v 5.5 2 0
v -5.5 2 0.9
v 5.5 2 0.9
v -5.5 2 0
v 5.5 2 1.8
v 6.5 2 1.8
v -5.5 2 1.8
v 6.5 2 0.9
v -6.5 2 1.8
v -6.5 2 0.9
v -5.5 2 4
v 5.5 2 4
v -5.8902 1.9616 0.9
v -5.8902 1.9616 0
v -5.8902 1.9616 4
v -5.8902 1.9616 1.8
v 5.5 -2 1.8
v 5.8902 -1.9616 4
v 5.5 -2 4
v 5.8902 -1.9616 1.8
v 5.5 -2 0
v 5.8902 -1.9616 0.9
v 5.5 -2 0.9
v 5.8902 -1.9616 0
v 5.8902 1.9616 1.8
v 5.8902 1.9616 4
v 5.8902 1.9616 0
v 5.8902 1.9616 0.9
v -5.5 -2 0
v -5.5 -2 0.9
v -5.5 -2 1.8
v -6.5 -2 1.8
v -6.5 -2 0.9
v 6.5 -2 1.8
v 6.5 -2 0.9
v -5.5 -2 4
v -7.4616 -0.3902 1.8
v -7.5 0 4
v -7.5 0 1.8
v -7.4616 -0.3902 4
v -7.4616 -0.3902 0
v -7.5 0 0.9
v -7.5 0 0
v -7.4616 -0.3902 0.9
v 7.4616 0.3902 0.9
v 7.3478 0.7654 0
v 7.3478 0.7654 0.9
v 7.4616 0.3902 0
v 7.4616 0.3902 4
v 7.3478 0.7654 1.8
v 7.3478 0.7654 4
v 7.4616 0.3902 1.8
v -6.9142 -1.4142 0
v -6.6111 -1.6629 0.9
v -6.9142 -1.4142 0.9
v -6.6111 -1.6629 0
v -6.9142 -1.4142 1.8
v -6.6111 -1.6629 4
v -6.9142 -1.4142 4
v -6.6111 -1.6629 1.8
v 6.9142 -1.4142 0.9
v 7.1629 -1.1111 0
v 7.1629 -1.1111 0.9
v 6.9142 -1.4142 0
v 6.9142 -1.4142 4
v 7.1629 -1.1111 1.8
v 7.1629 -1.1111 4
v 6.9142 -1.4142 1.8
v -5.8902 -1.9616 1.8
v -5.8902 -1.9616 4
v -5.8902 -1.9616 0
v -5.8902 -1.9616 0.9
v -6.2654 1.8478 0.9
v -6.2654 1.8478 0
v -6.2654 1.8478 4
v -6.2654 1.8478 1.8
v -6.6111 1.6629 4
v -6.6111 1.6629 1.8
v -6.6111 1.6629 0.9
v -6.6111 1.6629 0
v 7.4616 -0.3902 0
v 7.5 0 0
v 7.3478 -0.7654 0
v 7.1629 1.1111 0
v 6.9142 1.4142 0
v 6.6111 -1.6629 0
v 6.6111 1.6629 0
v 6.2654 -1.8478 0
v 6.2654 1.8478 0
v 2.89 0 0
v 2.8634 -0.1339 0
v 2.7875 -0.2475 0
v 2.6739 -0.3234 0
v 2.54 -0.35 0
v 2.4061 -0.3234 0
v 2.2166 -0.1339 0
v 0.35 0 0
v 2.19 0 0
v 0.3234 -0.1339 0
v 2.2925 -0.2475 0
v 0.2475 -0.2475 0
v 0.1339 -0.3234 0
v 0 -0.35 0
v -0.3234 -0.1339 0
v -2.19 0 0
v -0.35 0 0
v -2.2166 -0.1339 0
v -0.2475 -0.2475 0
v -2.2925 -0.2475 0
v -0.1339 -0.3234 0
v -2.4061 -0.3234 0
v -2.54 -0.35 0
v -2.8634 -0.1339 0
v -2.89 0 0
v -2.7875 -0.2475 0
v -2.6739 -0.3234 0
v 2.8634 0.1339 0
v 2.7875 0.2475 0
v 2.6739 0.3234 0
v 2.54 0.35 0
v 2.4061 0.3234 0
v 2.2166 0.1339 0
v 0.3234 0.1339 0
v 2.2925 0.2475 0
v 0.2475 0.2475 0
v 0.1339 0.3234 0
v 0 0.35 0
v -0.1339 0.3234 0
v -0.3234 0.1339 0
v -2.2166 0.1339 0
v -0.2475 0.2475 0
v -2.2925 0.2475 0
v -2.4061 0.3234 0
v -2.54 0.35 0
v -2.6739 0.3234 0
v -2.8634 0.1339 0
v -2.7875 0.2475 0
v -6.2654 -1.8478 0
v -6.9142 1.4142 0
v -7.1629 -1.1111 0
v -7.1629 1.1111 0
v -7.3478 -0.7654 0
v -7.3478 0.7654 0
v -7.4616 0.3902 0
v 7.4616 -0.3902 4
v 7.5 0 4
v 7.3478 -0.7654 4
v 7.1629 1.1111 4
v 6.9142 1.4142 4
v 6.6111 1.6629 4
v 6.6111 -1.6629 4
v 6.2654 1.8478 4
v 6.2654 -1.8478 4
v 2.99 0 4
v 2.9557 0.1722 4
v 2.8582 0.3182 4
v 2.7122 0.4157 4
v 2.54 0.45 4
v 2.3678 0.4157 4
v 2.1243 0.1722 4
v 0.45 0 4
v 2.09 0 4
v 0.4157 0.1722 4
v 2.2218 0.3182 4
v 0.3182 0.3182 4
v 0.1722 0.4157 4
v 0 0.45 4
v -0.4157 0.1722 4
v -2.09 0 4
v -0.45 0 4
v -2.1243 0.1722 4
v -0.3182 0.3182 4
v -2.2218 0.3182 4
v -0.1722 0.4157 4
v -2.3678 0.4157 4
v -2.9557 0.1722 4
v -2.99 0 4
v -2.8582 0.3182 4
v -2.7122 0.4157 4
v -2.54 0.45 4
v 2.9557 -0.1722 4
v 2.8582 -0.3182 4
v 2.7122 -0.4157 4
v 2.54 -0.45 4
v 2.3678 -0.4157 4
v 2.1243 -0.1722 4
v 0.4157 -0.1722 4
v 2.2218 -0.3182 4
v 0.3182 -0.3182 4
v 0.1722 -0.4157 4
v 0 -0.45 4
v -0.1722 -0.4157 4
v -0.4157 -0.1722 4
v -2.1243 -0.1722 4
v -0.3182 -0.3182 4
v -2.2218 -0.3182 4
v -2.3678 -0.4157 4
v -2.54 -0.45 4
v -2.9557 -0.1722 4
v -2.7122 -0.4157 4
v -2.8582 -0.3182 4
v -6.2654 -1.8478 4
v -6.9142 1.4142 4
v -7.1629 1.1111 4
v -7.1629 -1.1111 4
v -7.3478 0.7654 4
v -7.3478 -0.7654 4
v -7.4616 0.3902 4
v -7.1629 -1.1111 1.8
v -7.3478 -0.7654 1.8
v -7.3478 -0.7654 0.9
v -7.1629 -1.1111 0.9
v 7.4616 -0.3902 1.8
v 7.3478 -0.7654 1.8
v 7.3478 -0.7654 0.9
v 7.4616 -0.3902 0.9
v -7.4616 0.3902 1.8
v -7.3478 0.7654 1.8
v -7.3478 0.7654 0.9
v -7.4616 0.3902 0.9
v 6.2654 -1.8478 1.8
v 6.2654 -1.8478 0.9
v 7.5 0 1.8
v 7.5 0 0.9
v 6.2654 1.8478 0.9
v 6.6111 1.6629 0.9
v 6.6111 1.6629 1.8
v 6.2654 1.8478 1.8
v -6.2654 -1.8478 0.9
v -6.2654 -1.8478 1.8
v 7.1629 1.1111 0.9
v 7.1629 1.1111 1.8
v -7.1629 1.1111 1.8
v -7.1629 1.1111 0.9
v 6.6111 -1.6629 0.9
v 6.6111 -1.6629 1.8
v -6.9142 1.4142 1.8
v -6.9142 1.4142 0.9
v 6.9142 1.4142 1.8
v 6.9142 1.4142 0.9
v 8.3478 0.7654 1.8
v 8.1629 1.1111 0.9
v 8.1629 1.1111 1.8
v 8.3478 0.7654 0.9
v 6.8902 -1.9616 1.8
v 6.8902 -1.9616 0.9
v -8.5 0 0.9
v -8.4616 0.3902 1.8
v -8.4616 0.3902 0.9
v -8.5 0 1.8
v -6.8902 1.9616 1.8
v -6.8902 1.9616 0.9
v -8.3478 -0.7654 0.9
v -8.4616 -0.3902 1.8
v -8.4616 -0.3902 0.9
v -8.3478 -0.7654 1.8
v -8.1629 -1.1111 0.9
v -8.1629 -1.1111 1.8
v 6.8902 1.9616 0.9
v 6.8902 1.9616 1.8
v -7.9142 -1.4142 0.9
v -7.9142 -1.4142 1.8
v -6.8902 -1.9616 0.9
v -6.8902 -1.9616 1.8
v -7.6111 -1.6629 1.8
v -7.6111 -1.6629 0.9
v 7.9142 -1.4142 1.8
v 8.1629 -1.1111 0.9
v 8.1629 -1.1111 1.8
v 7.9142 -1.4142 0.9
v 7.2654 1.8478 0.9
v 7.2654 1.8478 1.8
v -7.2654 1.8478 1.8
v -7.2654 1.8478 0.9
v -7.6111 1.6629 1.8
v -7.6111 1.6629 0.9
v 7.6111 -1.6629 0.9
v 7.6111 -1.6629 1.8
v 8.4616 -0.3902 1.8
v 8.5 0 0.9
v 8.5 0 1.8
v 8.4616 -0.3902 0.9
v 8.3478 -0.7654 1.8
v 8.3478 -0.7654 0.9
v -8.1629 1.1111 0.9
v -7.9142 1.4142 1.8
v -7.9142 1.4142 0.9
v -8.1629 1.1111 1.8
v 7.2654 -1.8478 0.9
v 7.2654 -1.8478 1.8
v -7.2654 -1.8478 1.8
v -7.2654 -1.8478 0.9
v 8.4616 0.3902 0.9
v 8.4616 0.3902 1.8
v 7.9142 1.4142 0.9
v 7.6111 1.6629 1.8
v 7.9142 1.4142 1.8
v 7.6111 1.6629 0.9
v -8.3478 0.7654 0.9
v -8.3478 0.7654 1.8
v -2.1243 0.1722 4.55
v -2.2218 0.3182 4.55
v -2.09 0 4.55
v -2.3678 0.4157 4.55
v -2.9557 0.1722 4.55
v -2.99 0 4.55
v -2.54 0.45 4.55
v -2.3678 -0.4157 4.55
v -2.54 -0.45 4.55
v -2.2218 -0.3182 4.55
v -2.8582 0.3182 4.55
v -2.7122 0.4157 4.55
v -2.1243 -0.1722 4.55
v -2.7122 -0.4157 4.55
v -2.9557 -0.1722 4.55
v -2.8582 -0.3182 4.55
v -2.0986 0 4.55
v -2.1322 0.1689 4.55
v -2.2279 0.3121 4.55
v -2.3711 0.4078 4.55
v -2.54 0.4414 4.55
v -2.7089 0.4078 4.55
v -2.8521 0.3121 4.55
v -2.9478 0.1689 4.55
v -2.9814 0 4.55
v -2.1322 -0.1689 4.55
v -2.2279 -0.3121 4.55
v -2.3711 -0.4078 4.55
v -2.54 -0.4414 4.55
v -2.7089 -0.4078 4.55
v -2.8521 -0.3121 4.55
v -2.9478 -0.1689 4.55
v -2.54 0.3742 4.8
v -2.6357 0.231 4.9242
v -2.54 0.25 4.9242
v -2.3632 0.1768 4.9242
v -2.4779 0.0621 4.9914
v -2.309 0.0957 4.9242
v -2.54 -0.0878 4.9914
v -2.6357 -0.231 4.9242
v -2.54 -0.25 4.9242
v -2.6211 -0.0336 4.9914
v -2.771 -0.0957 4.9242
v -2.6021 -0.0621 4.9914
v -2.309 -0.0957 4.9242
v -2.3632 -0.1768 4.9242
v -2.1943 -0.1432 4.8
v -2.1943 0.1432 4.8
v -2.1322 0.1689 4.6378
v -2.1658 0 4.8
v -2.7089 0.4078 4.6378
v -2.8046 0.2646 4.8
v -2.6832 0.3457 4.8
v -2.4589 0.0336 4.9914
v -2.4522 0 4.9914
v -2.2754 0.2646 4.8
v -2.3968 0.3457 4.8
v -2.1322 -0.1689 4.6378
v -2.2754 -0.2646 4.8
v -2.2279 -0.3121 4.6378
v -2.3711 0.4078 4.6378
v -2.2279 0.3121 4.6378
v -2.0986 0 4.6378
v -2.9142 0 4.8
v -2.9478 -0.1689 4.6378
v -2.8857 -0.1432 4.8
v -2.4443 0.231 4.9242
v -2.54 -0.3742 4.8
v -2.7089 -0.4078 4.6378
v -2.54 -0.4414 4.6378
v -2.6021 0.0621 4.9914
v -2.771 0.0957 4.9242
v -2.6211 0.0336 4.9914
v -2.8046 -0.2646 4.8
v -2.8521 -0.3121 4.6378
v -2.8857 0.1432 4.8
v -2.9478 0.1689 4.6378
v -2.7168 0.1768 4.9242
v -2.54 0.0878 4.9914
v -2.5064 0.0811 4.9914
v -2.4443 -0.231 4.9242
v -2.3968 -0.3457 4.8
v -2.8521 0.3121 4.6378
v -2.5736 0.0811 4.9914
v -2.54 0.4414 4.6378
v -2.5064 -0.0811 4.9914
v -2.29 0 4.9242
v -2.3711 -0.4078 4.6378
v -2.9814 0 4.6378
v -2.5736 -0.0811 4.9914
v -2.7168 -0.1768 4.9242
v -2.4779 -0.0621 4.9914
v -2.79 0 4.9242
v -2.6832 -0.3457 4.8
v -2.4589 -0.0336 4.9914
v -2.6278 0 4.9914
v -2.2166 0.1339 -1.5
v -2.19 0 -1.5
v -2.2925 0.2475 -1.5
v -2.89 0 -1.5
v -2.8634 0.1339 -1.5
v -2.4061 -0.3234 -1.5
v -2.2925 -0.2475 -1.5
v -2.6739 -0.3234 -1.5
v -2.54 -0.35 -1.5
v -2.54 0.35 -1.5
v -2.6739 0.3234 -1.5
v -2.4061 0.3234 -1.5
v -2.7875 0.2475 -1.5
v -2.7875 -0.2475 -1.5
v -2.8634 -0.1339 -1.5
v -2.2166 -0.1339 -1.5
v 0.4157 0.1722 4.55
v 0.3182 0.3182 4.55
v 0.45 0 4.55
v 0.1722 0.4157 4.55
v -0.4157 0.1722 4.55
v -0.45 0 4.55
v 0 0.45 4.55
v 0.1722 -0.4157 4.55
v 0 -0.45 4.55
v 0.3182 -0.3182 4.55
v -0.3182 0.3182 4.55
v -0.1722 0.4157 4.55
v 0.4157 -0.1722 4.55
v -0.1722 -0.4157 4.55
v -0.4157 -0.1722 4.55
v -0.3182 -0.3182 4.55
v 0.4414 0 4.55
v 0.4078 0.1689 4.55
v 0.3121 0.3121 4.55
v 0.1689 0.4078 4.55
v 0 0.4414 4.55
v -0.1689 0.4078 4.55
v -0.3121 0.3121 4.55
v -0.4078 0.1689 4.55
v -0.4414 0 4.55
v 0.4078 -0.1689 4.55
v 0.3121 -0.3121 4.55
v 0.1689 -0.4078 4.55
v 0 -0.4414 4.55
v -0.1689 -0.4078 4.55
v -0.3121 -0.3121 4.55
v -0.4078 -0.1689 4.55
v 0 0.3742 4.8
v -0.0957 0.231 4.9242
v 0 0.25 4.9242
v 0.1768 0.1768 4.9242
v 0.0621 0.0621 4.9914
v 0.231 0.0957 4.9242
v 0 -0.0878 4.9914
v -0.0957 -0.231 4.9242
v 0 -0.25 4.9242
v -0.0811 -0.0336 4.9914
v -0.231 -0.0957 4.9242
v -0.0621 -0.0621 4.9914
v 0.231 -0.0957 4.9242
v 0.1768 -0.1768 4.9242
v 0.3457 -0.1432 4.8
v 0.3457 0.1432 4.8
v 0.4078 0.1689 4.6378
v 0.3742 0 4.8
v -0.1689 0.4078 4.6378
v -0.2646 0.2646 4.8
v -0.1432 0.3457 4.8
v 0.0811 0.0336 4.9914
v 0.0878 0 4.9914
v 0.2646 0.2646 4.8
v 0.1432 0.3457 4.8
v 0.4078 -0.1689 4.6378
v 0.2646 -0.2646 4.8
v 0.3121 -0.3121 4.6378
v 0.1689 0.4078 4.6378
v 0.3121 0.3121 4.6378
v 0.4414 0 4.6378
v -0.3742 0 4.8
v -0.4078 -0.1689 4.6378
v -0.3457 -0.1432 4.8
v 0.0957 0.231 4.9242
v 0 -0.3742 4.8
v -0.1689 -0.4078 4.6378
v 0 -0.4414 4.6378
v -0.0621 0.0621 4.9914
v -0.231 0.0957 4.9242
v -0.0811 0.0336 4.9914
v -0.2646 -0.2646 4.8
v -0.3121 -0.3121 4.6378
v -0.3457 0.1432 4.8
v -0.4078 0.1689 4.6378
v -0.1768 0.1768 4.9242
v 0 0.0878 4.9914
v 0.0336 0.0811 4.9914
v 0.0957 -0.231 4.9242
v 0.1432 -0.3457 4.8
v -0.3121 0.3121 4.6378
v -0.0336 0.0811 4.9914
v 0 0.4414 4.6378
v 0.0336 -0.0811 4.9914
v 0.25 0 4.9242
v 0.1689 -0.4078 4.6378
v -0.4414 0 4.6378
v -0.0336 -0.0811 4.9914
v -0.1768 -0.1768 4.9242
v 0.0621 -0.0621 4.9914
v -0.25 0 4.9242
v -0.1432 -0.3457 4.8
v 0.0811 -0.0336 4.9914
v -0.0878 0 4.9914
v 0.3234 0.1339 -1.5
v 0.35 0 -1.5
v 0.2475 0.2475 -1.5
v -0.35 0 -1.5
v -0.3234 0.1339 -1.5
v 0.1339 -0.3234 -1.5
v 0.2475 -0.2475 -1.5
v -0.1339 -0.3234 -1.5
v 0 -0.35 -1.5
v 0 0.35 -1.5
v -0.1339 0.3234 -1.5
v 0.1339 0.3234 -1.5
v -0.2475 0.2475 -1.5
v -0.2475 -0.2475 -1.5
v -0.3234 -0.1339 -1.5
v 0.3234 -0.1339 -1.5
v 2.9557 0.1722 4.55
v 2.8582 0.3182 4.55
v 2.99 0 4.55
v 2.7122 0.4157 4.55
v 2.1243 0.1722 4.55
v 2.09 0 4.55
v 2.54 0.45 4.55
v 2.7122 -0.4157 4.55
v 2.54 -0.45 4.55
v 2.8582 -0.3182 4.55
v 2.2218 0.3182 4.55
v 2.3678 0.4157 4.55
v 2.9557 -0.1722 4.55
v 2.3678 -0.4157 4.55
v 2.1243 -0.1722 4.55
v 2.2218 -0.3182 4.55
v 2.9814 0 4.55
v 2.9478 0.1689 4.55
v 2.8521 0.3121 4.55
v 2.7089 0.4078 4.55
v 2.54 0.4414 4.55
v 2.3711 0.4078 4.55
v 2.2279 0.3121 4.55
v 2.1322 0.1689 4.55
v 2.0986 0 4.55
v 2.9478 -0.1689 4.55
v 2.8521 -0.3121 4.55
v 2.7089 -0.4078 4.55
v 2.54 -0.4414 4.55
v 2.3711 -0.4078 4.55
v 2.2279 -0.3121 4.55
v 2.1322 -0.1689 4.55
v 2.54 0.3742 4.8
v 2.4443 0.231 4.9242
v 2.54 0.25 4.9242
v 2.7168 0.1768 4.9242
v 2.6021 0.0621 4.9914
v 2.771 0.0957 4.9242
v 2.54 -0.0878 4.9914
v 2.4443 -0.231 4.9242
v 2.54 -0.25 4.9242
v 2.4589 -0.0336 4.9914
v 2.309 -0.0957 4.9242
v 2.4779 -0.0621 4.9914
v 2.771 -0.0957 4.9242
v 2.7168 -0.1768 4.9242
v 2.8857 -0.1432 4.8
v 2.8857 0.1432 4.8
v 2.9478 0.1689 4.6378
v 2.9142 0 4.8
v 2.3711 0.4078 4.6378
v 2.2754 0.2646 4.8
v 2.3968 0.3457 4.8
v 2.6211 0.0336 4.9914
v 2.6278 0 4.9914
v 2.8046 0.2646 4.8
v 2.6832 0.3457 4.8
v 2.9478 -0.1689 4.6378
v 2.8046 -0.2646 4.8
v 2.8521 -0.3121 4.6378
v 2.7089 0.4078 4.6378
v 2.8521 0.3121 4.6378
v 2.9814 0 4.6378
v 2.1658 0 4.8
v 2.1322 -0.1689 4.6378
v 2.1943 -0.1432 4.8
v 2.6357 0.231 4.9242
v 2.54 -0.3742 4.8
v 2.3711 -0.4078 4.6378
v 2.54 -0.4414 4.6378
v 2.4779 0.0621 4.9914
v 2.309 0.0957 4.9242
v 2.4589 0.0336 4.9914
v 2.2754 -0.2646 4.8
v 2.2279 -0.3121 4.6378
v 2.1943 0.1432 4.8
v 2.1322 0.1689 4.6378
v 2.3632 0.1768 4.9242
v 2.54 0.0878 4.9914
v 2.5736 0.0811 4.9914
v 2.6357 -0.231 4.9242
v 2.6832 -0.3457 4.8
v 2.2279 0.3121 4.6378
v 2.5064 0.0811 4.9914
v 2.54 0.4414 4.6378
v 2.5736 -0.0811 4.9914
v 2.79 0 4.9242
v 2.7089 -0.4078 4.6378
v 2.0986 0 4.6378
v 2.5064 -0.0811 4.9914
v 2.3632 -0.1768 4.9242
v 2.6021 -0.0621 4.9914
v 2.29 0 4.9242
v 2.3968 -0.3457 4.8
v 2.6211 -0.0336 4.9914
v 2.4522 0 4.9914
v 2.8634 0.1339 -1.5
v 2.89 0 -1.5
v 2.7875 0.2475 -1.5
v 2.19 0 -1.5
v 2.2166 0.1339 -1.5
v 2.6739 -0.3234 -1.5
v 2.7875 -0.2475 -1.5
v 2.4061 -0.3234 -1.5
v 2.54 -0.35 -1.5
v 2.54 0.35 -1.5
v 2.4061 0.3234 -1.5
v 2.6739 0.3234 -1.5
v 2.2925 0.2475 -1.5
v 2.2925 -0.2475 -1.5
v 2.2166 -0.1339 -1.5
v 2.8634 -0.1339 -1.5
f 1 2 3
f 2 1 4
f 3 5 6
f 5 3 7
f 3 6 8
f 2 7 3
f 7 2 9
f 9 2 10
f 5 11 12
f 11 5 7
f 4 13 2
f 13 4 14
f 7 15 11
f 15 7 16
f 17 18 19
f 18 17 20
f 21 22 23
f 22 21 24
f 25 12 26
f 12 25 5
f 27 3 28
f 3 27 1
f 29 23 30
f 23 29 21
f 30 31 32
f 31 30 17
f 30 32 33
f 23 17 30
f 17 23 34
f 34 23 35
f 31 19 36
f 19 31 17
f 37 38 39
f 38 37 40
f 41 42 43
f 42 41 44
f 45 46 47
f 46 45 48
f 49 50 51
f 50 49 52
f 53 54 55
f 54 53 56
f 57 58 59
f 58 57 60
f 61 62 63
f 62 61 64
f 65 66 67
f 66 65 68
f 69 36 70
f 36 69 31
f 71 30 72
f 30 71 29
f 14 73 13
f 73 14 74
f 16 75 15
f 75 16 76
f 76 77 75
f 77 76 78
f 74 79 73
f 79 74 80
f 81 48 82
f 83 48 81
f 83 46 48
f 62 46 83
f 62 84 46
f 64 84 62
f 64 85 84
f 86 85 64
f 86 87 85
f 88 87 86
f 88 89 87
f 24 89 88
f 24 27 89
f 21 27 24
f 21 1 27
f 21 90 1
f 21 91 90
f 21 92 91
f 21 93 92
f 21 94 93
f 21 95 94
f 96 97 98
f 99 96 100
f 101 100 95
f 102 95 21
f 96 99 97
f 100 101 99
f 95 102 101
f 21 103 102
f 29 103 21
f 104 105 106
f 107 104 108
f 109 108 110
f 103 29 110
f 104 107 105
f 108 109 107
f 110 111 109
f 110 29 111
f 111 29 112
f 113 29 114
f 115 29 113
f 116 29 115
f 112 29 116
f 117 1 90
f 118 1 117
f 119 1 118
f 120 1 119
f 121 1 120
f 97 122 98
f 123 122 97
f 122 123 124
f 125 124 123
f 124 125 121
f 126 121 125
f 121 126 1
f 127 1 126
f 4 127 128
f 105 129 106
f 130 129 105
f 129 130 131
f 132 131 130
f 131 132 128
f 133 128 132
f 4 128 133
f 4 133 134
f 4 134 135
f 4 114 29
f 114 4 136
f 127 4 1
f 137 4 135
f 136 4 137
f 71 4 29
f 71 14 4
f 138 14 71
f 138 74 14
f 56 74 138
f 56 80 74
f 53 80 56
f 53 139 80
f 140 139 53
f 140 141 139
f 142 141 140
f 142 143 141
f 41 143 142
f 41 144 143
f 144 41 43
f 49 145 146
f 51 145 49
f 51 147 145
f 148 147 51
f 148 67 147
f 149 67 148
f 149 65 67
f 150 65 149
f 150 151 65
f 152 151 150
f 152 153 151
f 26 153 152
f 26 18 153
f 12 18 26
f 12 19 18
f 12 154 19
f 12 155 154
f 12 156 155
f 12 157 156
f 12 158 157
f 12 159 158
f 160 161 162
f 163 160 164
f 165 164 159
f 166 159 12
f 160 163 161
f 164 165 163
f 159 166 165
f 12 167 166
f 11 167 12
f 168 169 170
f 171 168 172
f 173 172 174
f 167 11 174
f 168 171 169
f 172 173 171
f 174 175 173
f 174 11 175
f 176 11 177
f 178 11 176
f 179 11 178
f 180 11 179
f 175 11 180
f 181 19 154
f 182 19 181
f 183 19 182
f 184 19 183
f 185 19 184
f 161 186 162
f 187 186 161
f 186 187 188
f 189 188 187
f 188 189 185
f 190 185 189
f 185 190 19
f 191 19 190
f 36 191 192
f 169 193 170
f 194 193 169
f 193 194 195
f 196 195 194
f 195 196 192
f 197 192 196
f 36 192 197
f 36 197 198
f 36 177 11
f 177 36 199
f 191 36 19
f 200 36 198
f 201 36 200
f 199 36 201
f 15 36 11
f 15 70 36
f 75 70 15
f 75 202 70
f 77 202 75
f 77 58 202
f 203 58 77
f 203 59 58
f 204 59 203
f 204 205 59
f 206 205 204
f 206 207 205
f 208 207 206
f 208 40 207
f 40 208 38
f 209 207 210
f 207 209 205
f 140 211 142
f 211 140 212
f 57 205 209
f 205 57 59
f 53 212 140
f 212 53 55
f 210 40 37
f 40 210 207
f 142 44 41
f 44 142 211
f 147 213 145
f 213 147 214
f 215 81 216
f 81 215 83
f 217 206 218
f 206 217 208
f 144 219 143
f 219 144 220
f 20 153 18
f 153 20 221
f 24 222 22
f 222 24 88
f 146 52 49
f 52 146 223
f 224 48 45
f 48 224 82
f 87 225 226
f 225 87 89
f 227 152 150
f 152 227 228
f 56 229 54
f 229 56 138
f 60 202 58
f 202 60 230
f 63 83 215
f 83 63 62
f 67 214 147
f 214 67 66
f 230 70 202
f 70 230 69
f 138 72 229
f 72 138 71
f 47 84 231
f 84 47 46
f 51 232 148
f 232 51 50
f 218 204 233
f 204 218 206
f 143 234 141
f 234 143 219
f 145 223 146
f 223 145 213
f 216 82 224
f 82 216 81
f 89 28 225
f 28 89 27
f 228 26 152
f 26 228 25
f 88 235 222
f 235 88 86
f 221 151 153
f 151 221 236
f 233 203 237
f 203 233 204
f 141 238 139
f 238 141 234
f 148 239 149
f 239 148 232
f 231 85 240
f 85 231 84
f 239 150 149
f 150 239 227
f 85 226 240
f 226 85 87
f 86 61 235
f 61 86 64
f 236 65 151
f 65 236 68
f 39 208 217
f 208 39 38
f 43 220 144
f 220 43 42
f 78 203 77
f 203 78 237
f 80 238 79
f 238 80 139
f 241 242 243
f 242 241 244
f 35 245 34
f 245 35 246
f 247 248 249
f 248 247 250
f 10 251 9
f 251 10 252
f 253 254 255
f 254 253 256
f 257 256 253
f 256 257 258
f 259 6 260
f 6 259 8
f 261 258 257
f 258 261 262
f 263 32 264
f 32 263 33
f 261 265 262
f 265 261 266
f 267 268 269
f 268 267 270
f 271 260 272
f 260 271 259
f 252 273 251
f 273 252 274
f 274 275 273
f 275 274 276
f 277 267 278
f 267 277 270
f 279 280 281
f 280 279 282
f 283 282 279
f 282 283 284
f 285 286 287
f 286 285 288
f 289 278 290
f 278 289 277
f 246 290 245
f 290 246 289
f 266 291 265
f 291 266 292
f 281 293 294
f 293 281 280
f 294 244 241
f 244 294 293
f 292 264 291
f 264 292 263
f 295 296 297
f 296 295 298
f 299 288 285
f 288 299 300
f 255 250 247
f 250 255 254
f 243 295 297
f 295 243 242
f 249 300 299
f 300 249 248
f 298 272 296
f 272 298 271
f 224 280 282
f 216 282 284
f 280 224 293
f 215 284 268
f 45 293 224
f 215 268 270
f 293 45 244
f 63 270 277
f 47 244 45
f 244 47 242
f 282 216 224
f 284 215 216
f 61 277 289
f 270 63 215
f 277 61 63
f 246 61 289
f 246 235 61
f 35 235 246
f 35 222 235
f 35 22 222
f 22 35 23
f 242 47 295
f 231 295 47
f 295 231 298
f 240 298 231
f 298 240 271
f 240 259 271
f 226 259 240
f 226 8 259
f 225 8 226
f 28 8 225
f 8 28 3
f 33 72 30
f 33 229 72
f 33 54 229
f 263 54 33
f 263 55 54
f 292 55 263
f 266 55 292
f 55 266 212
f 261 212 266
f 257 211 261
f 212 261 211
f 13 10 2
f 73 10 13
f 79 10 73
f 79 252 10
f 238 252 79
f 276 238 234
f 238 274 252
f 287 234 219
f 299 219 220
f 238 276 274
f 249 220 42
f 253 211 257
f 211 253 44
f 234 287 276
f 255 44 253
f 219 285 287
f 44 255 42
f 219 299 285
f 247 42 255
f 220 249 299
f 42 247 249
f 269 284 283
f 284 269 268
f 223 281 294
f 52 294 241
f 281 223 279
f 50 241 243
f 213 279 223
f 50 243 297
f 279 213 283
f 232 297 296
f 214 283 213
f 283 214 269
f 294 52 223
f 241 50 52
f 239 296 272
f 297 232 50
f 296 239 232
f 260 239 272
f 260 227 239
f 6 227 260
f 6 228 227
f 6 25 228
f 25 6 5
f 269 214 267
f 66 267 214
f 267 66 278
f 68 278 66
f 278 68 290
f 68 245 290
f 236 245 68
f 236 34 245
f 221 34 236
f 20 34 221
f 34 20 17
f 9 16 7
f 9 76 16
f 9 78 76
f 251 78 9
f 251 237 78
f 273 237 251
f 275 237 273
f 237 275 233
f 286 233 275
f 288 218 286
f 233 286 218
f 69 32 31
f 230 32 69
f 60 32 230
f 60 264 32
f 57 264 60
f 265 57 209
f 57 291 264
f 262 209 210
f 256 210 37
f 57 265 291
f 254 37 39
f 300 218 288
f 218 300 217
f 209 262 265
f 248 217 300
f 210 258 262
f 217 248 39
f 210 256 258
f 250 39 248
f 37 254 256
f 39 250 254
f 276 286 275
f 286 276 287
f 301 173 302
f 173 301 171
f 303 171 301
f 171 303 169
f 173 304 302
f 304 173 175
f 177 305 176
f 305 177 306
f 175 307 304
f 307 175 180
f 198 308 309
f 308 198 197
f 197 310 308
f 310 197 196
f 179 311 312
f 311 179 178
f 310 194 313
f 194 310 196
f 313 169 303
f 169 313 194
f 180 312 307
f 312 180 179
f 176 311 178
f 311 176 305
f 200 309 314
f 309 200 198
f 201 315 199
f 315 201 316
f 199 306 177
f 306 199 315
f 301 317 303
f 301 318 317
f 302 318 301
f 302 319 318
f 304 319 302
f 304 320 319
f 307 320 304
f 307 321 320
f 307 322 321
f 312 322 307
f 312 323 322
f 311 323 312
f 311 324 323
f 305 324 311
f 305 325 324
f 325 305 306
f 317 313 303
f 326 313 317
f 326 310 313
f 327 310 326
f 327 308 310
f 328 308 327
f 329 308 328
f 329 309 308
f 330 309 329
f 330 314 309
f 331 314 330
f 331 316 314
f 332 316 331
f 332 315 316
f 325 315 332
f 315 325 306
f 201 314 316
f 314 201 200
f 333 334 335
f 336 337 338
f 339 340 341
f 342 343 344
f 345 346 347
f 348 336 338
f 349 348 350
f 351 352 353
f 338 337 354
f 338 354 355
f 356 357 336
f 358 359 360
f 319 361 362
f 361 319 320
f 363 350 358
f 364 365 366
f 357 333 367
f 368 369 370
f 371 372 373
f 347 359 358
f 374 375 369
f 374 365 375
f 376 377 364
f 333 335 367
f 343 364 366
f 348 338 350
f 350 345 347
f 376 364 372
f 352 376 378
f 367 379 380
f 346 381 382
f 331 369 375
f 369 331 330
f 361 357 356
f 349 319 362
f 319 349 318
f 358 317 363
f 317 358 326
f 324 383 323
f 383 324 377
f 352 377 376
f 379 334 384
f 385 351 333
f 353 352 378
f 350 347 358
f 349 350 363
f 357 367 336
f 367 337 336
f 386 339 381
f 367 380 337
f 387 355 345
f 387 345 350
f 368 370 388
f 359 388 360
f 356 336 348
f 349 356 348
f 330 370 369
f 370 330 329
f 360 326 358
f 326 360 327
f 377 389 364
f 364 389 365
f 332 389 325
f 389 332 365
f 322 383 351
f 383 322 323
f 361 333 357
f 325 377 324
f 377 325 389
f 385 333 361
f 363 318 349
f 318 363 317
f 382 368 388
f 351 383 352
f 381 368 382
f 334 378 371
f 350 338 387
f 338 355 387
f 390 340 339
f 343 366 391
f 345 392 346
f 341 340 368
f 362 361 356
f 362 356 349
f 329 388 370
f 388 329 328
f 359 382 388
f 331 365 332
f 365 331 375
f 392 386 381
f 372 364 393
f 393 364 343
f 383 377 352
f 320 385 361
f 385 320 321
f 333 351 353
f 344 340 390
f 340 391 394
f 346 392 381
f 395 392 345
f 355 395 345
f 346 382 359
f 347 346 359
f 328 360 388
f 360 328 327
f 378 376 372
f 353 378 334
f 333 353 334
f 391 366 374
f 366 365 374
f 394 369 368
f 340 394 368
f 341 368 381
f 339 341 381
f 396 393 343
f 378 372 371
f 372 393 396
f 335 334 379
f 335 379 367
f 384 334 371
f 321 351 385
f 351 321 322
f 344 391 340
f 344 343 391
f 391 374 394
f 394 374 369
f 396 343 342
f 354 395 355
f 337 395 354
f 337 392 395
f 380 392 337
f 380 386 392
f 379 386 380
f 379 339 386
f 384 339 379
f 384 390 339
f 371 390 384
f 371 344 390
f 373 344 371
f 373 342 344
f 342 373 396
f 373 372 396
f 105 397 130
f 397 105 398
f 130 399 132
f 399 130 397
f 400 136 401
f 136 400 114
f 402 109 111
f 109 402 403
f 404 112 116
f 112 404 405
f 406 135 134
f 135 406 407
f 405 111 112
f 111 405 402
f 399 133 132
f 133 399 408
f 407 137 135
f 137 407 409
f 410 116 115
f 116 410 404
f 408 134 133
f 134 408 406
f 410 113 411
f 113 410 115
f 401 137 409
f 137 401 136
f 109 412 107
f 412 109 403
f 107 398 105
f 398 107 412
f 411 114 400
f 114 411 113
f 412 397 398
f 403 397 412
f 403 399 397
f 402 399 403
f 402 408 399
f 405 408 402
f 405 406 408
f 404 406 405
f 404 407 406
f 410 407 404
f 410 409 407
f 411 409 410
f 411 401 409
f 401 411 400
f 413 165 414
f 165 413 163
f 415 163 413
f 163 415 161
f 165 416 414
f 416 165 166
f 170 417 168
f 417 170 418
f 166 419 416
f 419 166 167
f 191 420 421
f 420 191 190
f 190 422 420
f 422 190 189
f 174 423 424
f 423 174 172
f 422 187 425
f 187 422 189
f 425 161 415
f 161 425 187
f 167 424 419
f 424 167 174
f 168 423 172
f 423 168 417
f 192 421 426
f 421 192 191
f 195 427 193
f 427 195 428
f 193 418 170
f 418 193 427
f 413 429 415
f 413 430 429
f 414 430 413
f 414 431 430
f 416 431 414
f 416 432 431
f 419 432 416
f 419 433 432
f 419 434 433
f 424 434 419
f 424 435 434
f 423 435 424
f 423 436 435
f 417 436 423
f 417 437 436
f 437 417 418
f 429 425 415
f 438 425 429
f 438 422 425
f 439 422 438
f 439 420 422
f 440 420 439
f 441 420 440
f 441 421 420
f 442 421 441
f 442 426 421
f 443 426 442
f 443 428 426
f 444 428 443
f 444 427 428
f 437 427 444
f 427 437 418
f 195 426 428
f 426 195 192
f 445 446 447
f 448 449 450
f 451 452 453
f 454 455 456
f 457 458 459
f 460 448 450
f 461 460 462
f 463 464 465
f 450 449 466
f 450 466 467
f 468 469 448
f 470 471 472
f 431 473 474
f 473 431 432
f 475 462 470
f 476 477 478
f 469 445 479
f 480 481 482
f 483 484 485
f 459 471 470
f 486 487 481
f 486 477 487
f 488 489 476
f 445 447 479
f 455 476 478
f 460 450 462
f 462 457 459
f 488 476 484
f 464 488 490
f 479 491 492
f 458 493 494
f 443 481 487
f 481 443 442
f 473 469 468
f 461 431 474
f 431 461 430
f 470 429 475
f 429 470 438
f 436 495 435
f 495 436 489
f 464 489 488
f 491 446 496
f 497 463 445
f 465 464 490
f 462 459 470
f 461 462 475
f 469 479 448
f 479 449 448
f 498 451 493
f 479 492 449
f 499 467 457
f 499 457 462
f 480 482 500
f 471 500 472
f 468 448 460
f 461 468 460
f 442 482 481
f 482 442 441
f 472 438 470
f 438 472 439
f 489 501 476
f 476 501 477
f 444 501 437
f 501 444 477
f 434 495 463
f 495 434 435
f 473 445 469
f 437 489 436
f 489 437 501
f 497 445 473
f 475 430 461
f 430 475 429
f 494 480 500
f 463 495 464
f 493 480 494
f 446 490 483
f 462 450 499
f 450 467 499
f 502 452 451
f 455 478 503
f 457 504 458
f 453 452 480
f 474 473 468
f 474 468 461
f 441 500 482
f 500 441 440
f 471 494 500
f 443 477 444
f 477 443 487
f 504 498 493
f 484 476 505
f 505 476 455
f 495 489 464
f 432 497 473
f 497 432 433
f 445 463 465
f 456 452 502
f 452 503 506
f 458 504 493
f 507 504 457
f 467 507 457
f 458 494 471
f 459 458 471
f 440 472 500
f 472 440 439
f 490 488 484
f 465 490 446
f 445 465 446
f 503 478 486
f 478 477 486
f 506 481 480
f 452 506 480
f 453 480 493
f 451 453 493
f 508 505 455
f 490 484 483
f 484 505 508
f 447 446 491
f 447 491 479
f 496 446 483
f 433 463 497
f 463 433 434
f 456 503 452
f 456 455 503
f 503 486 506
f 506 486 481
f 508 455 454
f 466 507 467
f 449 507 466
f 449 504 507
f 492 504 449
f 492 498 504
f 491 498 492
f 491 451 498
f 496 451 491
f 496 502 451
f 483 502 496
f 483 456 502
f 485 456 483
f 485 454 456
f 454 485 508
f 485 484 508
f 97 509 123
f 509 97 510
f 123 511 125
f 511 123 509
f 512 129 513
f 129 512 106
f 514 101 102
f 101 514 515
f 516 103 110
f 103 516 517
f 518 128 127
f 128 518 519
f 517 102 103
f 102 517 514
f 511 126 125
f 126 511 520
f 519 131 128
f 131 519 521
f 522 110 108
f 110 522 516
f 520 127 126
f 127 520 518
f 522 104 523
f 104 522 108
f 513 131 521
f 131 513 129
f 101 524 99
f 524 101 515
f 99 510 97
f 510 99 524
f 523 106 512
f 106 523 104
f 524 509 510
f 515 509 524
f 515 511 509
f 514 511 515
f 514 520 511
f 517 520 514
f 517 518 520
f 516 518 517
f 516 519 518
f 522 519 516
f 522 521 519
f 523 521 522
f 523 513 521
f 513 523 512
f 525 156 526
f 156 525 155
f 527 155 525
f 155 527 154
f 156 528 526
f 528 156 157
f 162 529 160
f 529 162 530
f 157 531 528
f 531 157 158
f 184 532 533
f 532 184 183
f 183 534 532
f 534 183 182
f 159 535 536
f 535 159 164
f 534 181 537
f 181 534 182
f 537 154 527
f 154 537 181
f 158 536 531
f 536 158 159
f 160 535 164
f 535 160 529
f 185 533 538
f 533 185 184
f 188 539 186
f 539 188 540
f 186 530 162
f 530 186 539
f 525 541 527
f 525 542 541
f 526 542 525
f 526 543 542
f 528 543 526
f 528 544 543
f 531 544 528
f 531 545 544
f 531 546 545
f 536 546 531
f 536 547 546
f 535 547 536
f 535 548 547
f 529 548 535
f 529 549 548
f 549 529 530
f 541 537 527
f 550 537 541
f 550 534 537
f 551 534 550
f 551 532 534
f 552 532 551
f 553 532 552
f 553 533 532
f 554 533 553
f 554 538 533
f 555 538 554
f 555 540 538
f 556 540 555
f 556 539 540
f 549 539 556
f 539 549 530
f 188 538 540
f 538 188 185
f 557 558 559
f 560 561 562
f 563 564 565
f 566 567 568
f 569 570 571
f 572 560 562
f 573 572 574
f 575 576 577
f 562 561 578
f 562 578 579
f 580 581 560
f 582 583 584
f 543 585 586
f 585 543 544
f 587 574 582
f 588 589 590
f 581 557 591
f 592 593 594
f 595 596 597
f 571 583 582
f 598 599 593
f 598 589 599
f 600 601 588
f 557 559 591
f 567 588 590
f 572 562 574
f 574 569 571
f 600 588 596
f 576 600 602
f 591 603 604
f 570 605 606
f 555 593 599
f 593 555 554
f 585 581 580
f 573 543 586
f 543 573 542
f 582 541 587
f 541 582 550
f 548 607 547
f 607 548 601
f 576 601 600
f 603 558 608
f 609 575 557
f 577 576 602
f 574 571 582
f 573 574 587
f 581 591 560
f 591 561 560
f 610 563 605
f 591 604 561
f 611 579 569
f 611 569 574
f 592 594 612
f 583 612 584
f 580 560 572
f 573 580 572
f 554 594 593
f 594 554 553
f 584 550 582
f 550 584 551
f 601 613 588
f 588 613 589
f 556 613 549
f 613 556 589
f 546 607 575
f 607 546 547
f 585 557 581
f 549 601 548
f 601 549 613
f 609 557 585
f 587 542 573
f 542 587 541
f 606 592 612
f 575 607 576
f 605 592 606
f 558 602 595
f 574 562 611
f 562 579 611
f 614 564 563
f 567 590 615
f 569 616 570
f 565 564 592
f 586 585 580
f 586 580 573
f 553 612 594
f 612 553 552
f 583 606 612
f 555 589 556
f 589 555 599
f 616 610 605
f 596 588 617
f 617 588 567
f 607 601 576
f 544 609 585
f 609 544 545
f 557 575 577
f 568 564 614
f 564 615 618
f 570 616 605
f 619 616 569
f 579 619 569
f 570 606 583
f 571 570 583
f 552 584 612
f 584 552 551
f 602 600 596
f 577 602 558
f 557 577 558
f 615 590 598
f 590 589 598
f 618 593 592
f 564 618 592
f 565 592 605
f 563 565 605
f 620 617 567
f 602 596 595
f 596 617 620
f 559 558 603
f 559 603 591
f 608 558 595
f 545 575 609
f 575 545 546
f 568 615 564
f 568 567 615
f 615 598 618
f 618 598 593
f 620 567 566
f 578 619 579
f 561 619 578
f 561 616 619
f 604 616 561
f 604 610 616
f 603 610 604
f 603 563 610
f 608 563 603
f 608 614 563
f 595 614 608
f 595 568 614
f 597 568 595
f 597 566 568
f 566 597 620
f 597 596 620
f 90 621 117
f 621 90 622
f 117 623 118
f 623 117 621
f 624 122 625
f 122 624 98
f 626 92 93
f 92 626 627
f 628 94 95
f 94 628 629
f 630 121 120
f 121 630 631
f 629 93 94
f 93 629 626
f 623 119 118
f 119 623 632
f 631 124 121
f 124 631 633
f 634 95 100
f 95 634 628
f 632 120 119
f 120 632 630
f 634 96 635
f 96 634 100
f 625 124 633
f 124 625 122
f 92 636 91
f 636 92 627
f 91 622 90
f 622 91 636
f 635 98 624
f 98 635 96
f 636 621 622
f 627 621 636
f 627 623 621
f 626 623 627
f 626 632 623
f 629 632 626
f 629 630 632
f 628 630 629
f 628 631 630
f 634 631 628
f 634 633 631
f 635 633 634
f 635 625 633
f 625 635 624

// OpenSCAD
// =====================================================
//  Conector magnético Pogo Pin 3 pines — MACHO (pines retráctiles)
//  Montaje: con cables (colas traseras para soldar)
//  Fuente de cotas: plano del fabricante "3Pin spacing 2.54mm"
//  Ejes: X = largo (pines alineados en X), Y = ancho, Z = alto
//  Origen: centro de la base; cara de acople en Z = alto_cuerpo
//  Unidades: milímetros
// =====================================================

// ================= VARIABLES GLOBALES =================

// --- 1. Cuerpo (óvalo / estadio) ---
largo_cuerpo   = 15;     // cota 15,00
ancho_cuerpo   = 4;      // cota 4,00
alto_cuerpo    = 4;      // cota 4,00

// --- 2. Pestaña perimetral ---
largo_pestana  = 17;     // cota 17,00
pestana_z0     = 0.9;    // medido a escala (desde la base)
pestana_esp    = 0.9;    // medido a escala

// --- 3. Imanes (N a la izquierda, S a la derecha) ---
sep_imanes     = 11;     // cota 11,00 entre centros
d_iman         = 3;      // medido a escala
alto_iman      = 2;      // cota 2,00 (al ras de la cara de acople)

// --- 4. Pines ---
n_pines        = 3;
paso           = 2.54;   // cota 2,54
d_punta        = 0.9;    // cota Ø0,90
alto_punta     = 1;      // sobresale 1,00 (altura de trabajo 5,00)
d_cola         = 0.7;    // cota Ø0,70
largo_cola     = 1.5;    // cota 1,50

// --- Calidad / tolerancias ---
eps = 0.01;
$fn = 32;


// ================= UTILIDADES =================
// Óvalo (estadio) centrado de largo L, ancho A y alto H
module estadio(L, A, H) {
    hull()
        for (x = [-(L - A) / 2, (L - A) / 2])
            translate([x, 0, 0]) cylinder(d = A, h = H);
}

function x_pin(i) = (i - (n_pines - 1) / 2) * paso;


// ================= 1-2. CARCASA =================
module carcasa() {
    estadio(largo_cuerpo, ancho_cuerpo, alto_cuerpo);
    translate([0, 0, pestana_z0])
        estadio(largo_pestana, ancho_cuerpo, pestana_esp);
}


// ================= 3. IMANES =================
module imanes() {
    for (x = [-sep_imanes / 2, sep_imanes / 2])
        translate([x, 0, alto_cuerpo - alto_iman])
            cylinder(d = d_iman, h = alto_iman);
}


// ================= 4. PINES =================
// Punta retráctil con extremo semiesférico + cola para soldar el cable
module pin() {
    r = d_punta / 2;
    // Punta (parte de la base hundida eps para unirse al cuerpo)
    translate([0, 0, alto_cuerpo - eps]) {
        cylinder(d = d_punta, h = alto_punta - r + eps, $fn = 16);
        translate([0, 0, alto_punta - r + eps]) sphere(r = r, $fn = 16);
    }
    // Cola trasera
    translate([0, 0, -largo_cola])
        cylinder(d = d_cola, h = largo_cola + eps, $fn = 16);
}

module pines() {
    for (i = [0 : n_pines - 1])
        translate([x_pin(i), 0, 0]) pin();
}


// ================= ENSAMBLE =================
module pogo_macho() {
    color("#1c1c1c") carcasa();
    color("#9a9a9a") imanes();
    color("#d4af37") pines();
}

pogo_macho();
